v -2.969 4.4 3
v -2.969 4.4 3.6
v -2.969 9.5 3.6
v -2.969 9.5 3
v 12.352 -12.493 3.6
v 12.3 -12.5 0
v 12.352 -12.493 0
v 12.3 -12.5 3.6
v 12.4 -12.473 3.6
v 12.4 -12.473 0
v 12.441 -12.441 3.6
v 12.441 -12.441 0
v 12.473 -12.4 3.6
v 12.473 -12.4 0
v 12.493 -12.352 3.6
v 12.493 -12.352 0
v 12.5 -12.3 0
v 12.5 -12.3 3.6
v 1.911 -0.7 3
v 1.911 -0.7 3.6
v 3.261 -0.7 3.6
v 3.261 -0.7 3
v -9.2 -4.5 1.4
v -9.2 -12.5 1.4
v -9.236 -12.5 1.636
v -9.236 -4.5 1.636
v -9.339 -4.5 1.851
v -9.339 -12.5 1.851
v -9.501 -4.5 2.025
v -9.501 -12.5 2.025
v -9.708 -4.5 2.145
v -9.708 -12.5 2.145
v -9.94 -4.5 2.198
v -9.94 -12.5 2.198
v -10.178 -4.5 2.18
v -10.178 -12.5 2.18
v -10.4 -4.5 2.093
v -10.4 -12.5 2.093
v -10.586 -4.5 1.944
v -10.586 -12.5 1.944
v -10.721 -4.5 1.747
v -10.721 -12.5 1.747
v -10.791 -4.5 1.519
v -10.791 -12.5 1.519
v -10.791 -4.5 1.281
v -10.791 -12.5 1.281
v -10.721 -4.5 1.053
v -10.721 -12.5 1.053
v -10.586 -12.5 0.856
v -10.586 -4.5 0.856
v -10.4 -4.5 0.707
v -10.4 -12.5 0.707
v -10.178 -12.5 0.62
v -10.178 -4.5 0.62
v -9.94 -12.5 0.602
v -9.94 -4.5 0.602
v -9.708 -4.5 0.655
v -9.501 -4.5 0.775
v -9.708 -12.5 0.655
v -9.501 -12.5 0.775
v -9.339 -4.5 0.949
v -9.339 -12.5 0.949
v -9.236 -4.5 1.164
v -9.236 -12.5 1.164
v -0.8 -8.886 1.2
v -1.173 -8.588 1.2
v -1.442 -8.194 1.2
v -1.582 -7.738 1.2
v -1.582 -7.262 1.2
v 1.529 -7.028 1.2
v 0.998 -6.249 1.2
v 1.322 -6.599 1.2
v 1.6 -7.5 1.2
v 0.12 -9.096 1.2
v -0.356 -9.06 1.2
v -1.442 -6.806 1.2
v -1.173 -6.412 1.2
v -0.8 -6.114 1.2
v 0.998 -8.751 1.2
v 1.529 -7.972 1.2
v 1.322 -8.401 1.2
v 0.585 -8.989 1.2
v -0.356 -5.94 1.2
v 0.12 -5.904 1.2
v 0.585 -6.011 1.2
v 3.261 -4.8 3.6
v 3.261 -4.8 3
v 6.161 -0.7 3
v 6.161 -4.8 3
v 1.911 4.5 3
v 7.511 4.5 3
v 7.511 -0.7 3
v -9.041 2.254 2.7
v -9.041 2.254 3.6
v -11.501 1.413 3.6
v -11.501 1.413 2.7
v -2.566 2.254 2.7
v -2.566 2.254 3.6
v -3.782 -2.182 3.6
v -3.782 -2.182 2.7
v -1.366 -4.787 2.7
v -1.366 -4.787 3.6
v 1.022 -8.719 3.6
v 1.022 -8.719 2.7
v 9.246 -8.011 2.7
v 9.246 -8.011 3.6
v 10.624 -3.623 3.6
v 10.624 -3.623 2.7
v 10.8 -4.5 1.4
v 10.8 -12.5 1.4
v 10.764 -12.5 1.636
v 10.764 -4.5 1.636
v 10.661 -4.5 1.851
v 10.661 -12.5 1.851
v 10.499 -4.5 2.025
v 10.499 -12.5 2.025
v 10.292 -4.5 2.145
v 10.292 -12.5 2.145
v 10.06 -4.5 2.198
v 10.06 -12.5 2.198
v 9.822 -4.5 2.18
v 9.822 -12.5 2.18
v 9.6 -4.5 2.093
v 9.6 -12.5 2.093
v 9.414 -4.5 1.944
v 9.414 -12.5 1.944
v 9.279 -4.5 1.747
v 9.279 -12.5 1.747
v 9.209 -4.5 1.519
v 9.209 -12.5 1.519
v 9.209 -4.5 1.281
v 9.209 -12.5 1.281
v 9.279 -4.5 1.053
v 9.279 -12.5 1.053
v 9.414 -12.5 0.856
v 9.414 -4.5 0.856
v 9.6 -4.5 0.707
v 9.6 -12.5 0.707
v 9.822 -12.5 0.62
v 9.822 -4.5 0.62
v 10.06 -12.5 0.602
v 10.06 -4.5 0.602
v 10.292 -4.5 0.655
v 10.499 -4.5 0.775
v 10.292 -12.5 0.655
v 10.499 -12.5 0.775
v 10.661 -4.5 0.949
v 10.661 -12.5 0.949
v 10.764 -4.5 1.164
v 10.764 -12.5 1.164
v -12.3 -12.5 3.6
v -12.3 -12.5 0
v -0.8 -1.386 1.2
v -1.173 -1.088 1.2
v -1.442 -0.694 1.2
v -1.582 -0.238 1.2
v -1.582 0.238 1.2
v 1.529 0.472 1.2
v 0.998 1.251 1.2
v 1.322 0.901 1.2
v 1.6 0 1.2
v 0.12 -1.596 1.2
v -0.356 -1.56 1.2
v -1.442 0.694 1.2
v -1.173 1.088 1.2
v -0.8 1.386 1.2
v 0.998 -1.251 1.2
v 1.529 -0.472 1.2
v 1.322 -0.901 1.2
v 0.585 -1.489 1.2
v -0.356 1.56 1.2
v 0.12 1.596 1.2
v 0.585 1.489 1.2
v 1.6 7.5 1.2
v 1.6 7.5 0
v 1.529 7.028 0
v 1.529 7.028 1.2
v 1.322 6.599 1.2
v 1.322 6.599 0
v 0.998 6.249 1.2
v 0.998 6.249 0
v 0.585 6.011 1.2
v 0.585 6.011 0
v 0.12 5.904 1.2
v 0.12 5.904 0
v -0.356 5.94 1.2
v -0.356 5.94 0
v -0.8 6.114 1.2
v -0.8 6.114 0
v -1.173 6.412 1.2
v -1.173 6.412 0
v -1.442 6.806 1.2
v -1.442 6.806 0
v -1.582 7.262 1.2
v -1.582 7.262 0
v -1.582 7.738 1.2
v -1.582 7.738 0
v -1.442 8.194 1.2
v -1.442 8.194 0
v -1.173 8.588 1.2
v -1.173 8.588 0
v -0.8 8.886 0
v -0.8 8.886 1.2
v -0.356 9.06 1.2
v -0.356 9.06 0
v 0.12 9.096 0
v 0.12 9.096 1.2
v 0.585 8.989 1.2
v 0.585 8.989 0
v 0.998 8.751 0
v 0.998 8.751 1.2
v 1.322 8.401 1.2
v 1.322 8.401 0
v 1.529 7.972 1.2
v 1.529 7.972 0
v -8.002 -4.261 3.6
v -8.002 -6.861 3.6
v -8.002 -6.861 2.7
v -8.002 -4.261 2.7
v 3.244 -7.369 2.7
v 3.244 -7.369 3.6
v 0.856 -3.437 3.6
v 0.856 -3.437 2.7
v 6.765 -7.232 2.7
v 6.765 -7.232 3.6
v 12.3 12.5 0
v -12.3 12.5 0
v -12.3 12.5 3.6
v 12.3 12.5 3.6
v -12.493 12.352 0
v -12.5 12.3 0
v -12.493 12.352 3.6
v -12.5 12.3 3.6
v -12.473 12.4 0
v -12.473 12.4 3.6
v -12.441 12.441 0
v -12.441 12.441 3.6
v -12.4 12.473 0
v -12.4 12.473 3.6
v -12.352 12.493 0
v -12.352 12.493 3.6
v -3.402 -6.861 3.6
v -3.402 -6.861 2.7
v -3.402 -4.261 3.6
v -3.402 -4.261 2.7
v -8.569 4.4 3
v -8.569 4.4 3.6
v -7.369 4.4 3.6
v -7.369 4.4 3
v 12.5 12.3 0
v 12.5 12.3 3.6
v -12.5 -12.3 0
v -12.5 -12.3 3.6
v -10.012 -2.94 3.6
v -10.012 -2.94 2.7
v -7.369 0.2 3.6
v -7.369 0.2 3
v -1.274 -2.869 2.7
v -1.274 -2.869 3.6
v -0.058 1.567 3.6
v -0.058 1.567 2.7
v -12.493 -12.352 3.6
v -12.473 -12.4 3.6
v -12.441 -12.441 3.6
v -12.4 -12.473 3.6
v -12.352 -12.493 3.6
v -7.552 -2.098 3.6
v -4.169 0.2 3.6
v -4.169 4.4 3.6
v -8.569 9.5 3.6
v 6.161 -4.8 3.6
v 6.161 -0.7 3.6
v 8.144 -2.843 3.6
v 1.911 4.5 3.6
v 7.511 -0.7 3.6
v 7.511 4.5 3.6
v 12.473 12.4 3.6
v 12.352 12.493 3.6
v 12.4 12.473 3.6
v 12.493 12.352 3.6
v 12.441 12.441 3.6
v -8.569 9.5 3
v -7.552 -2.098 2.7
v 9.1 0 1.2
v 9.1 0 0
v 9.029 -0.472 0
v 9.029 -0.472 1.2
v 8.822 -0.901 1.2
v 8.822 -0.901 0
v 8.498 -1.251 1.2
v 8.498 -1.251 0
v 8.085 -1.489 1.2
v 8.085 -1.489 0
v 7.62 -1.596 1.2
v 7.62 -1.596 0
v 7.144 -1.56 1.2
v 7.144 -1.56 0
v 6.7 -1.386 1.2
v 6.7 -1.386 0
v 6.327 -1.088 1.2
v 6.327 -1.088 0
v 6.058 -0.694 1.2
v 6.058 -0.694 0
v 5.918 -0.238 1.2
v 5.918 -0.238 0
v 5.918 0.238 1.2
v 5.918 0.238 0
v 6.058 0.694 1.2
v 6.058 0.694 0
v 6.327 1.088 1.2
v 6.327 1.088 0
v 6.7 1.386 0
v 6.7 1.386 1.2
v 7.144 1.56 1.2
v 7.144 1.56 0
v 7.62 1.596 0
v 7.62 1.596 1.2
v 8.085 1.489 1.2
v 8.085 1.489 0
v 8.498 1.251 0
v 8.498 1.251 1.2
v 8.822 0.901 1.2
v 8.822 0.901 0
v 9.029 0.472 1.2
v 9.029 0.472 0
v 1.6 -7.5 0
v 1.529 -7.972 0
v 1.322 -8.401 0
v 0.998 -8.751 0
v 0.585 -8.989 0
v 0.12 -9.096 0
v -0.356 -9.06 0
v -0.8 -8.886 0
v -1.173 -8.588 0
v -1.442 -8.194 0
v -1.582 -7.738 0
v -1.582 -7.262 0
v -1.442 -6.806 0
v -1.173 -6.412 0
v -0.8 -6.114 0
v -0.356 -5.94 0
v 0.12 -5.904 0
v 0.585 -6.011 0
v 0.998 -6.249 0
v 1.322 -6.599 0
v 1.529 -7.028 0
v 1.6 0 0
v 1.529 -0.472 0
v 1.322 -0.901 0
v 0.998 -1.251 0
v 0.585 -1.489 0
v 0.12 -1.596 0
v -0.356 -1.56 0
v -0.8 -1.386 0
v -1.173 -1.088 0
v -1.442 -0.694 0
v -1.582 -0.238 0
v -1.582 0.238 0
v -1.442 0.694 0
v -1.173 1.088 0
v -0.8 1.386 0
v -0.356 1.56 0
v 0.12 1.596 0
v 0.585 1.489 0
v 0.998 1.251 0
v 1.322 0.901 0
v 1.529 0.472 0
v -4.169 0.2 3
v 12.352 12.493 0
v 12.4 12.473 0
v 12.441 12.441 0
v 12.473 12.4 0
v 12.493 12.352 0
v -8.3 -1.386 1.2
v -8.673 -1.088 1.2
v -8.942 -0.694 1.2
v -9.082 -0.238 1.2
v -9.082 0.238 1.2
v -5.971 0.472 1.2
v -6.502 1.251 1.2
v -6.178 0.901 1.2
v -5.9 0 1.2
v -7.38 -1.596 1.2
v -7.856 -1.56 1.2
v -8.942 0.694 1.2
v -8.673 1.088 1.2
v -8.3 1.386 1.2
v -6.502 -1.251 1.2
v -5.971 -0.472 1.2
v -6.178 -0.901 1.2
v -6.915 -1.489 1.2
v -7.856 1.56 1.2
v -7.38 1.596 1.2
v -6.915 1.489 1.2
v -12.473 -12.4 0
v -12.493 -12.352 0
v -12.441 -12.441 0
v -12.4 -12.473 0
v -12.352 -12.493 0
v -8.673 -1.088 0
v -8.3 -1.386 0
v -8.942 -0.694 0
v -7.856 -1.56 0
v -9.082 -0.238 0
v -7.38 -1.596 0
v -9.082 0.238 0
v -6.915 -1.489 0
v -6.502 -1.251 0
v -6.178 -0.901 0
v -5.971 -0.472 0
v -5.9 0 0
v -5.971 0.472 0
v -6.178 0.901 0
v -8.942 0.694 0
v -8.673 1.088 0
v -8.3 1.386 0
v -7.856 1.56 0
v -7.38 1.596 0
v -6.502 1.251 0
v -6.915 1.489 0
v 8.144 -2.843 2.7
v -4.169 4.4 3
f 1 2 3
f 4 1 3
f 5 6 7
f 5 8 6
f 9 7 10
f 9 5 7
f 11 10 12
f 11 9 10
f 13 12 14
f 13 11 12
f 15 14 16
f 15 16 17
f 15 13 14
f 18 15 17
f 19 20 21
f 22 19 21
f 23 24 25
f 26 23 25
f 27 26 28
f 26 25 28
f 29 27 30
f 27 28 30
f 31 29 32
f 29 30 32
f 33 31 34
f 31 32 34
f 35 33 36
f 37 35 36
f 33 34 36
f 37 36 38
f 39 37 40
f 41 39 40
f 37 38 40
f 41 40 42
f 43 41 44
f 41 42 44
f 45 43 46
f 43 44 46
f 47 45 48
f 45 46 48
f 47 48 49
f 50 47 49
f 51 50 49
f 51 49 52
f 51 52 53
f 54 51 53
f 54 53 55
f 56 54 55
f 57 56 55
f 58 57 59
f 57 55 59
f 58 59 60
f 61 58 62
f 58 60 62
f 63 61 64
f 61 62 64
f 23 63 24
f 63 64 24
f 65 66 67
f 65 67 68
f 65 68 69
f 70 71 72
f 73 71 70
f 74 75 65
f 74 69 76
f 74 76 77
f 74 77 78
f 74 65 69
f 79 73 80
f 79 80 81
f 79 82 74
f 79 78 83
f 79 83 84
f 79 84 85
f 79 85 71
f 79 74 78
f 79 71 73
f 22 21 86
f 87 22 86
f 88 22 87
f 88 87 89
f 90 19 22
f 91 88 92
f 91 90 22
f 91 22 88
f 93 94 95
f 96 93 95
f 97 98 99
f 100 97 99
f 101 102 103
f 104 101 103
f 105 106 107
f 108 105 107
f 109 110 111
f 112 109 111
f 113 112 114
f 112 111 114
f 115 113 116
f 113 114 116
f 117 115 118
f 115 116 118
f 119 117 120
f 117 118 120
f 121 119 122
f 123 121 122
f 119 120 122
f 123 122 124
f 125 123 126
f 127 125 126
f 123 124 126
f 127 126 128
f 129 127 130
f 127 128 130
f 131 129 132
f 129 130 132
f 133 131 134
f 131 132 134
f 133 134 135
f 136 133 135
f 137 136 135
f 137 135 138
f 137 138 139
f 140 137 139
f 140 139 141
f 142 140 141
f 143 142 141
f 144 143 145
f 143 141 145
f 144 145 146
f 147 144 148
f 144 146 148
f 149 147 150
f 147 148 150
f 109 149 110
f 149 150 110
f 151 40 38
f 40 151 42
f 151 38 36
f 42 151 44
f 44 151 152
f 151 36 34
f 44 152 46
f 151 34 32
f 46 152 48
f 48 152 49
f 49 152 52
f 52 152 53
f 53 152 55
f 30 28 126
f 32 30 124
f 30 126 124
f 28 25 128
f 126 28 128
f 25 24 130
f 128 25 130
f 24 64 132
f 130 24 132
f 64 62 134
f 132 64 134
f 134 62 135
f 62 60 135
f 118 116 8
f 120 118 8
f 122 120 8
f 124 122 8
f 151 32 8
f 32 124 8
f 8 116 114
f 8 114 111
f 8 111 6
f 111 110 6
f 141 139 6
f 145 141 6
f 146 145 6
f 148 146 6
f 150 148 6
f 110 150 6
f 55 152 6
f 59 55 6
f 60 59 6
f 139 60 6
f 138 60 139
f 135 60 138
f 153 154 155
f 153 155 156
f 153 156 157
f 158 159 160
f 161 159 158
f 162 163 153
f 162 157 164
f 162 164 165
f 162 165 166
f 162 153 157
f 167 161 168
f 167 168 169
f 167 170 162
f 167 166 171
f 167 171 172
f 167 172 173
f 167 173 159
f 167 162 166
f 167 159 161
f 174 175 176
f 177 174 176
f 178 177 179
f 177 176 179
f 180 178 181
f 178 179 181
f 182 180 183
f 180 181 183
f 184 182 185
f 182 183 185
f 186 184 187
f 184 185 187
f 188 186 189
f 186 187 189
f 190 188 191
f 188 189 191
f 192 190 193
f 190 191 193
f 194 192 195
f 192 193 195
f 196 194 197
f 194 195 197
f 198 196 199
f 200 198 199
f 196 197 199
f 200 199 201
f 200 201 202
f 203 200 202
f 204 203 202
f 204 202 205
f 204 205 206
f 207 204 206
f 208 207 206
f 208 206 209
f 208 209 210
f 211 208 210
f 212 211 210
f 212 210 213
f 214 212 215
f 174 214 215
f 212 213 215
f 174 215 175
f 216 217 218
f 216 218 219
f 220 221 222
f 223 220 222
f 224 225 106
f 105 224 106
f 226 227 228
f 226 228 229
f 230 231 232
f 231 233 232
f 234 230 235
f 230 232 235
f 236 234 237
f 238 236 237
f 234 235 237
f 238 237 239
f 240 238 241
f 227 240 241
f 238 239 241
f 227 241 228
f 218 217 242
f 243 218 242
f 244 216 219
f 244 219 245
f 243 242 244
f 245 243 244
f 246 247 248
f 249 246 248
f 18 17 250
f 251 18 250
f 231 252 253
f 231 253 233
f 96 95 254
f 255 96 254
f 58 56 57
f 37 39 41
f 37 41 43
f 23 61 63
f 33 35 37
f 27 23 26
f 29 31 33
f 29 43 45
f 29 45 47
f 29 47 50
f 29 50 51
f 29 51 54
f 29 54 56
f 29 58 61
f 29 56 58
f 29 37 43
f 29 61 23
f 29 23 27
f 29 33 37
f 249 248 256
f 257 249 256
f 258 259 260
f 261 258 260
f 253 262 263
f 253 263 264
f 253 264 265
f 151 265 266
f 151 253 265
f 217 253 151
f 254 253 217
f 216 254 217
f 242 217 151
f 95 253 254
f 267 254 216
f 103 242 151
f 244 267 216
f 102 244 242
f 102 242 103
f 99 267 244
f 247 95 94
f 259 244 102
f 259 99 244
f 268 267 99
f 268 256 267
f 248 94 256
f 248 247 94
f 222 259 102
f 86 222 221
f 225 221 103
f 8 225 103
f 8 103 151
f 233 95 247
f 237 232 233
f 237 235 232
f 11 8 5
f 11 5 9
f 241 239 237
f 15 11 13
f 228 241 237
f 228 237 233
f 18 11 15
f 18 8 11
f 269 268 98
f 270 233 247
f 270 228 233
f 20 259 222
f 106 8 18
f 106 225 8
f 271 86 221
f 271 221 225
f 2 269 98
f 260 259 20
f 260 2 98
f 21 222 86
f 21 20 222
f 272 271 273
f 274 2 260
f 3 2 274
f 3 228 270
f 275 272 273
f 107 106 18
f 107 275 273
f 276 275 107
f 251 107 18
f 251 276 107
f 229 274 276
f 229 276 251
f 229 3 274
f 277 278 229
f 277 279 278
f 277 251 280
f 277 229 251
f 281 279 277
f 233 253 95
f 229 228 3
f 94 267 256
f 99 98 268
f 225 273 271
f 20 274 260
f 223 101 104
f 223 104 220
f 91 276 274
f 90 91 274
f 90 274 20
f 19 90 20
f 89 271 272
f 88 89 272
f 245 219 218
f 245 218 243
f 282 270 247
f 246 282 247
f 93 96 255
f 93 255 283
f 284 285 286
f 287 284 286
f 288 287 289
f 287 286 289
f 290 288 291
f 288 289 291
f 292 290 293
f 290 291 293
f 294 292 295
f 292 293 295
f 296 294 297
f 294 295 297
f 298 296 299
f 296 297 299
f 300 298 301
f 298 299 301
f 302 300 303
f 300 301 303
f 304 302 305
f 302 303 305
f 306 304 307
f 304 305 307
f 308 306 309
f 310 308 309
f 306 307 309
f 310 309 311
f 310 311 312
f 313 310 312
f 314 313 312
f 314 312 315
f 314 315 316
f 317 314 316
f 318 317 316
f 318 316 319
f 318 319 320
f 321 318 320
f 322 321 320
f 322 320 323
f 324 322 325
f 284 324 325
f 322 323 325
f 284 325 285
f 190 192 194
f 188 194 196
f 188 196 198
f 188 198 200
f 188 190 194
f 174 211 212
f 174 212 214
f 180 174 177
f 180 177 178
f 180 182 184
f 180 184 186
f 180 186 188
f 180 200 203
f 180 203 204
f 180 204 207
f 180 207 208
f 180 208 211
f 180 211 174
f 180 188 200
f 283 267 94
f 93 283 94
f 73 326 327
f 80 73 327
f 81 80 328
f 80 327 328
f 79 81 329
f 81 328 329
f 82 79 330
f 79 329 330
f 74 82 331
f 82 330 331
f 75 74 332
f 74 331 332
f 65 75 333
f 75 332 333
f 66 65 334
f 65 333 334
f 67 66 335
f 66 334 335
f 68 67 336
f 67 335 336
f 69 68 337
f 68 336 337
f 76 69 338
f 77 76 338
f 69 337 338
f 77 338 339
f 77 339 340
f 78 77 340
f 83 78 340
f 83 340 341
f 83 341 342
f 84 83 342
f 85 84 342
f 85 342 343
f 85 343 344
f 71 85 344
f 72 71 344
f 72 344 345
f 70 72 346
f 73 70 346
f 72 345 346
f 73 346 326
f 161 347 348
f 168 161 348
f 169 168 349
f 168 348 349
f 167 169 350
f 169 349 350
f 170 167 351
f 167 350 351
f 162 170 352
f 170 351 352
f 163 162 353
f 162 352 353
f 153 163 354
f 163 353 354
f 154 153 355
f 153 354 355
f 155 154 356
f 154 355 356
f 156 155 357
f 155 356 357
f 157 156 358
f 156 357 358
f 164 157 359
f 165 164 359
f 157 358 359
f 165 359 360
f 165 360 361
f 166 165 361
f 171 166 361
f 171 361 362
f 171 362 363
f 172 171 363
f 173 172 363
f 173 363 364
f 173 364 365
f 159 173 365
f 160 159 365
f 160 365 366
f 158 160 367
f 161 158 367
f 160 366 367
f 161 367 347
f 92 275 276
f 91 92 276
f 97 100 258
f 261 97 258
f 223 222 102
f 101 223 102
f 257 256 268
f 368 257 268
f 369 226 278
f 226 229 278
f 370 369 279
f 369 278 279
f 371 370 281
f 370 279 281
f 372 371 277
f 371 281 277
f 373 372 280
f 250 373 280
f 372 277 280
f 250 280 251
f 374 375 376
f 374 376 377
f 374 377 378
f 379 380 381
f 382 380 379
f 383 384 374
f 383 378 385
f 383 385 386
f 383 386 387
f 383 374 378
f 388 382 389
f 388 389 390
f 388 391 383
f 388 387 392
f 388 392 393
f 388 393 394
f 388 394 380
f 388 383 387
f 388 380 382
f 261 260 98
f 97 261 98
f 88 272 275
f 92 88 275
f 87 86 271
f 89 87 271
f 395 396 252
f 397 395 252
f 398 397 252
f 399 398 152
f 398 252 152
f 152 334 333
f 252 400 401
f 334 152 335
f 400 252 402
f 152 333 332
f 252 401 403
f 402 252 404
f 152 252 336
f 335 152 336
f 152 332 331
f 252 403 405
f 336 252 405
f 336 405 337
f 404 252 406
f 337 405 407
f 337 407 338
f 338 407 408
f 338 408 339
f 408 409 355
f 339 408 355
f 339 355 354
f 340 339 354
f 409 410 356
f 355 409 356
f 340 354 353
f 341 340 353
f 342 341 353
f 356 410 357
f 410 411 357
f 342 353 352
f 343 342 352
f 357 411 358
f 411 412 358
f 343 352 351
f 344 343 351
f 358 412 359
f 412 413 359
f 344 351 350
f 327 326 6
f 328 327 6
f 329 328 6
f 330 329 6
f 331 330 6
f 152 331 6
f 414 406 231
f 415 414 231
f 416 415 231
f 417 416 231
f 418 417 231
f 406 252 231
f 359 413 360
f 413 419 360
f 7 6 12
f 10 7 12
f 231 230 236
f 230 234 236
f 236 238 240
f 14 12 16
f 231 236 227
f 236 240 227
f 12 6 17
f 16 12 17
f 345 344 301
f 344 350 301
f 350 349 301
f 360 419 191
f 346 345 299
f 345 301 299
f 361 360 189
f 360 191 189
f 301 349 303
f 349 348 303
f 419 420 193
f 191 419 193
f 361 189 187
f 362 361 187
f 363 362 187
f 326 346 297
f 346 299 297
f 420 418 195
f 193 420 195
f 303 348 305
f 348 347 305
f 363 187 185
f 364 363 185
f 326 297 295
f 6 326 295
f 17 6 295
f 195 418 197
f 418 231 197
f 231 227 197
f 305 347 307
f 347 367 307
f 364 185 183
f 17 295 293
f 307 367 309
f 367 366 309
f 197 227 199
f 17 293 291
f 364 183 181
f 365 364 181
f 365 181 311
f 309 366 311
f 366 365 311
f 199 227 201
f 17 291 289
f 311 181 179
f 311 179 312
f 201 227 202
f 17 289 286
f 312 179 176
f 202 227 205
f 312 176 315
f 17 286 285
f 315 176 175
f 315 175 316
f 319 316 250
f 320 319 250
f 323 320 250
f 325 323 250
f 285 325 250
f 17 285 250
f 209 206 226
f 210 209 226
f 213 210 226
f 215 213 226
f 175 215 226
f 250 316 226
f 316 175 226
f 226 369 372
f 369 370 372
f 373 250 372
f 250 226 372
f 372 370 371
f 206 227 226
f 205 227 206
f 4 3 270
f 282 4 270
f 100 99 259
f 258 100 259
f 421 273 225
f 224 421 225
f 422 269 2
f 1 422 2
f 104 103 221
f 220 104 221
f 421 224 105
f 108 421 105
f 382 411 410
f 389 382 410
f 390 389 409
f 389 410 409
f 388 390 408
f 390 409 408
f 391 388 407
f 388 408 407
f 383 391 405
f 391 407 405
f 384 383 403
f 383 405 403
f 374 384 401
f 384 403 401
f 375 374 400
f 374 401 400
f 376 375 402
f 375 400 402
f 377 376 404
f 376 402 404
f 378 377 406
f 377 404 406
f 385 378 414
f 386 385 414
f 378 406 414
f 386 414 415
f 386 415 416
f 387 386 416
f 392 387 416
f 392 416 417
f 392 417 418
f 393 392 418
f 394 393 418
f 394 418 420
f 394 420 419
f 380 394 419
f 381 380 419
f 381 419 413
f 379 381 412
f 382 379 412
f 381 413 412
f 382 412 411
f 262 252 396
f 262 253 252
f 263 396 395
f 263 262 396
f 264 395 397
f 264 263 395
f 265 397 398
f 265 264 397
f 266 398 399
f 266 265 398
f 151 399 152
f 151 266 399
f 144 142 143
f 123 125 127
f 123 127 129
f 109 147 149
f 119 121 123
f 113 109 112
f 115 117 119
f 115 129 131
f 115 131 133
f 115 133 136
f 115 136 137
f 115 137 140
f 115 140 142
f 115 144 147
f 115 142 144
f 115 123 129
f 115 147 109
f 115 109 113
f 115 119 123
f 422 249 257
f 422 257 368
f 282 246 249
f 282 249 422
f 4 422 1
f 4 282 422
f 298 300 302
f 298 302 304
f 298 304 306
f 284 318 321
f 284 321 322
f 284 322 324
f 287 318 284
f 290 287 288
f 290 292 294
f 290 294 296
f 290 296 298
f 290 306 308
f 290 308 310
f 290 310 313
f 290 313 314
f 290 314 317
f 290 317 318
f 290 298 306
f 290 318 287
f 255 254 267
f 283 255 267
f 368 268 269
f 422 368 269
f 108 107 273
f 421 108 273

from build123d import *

# Parameters (mm, degrees)
F0_W      = 25
F0_H      = 25
F1_DEPTH  = 3.6
F3_DEPTH  = 0.6
F4_W      = 4.6
F4_H      = 2.6
F5_DEPTH  = 0.9
F6_R      = 1.6
F7_DEPTH  = 1.2
F8_R      = 0.2
F9_R      = 0.8
F10_DEPTH = 8


with BuildPart() as f1:
    # F0 (on Top) → F1 (new body)
    with BuildSketch(Plane.XY):
        Rectangle(F0_W, F0_H)
    extrude(amount=F1_DEPTH)

    # F2 (on face) → F3 (cut)
    with BuildSketch(Plane.XY.offset(3.6)):
        Polygon((-2.968572, 9.5), (-8.568572, 9.5), (-8.568572, 4.4), (-7.368572, 4.4), (-7.368572, 0.2), (-4.168572, 0.2), (-4.168572, 4.4), (-2.968572, 4.4), align=None)
        Polygon((7.511108, 4.5), (1.911108, 4.5), (1.911108, -0.7), (3.261108, -0.7), (3.261108, -4.8), (6.161108, -4.8), (6.161108, -0.7), (7.511108, -0.7), align=None)
    extrude(amount=-F3_DEPTH, mode=Mode.SUBTRACT)

    # F4 (on face) → F5 (cut)
    with BuildSketch(Plane.XY.offset(3.6)):
        Polygon((-7.552263, -2.098206), (-9.040832, 2.254283), (-11.500935, 1.412918), (-10.012366, -2.939571), align=None)
        Polygon((-0.058017, 1.566966), (-2.565525, 2.254283), (-3.781548, -2.182077), (-1.27404, -2.869394), align=None)
        Polygon((0.855684, -3.437364), (-1.366318, -4.78744), (1.02228, -8.718675), (3.244282, -7.368598), align=None)
        Polygon((10.624292, -3.622611), (8.143836, -2.843295), (6.765044, -7.231795), (9.245501, -8.011112), align=None)
        with Locations((-5.702388, -5.56096)):
            Rectangle(F4_W, F4_H)
    extrude(amount=-F5_DEPTH, mode=Mode.SUBTRACT)

    # F6 (on face) → F7 (cut)
    with BuildSketch(Plane(origin=(0, 0, 0), x_dir=(1, 0, 0), z_dir=(0, 0, -1))):
        with Locations((0, 7.5)):
            Circle(F6_R)
        Circle(F6_R)
        with Locations((0, -7.5)):
            Circle(F6_R)
        with Locations((-7.5, 0)):
            Circle(F6_R)
        with Locations((7.5, 0)):
            Circle(F6_R)
    extrude(amount=-F7_DEPTH, mode=Mode.SUBTRACT)

    # F8
    f8_edges = [f1.edges().sort_by_distance(p)[0] for p in [
        (-12.5, -12.5, 1.8),
        (12.5, -12.5, 1.8),
        (12.5, 12.5, 1.8),
        (-12.5, 12.5, 1.8),
    ]]
    fillet(f8_edges, radius=F8_R)

    # F9 (on face) → F10 (cut)
    with BuildSketch(Plane.XZ.offset(12.5)):
        with Locations((-10, 1.4)):
            Circle(F9_R)
        with Locations((10, 1.4)):
            Circle(F9_R)
    extrude(amount=-F10_DEPTH, mode=Mode.SUBTRACT)


solid = f1.part
